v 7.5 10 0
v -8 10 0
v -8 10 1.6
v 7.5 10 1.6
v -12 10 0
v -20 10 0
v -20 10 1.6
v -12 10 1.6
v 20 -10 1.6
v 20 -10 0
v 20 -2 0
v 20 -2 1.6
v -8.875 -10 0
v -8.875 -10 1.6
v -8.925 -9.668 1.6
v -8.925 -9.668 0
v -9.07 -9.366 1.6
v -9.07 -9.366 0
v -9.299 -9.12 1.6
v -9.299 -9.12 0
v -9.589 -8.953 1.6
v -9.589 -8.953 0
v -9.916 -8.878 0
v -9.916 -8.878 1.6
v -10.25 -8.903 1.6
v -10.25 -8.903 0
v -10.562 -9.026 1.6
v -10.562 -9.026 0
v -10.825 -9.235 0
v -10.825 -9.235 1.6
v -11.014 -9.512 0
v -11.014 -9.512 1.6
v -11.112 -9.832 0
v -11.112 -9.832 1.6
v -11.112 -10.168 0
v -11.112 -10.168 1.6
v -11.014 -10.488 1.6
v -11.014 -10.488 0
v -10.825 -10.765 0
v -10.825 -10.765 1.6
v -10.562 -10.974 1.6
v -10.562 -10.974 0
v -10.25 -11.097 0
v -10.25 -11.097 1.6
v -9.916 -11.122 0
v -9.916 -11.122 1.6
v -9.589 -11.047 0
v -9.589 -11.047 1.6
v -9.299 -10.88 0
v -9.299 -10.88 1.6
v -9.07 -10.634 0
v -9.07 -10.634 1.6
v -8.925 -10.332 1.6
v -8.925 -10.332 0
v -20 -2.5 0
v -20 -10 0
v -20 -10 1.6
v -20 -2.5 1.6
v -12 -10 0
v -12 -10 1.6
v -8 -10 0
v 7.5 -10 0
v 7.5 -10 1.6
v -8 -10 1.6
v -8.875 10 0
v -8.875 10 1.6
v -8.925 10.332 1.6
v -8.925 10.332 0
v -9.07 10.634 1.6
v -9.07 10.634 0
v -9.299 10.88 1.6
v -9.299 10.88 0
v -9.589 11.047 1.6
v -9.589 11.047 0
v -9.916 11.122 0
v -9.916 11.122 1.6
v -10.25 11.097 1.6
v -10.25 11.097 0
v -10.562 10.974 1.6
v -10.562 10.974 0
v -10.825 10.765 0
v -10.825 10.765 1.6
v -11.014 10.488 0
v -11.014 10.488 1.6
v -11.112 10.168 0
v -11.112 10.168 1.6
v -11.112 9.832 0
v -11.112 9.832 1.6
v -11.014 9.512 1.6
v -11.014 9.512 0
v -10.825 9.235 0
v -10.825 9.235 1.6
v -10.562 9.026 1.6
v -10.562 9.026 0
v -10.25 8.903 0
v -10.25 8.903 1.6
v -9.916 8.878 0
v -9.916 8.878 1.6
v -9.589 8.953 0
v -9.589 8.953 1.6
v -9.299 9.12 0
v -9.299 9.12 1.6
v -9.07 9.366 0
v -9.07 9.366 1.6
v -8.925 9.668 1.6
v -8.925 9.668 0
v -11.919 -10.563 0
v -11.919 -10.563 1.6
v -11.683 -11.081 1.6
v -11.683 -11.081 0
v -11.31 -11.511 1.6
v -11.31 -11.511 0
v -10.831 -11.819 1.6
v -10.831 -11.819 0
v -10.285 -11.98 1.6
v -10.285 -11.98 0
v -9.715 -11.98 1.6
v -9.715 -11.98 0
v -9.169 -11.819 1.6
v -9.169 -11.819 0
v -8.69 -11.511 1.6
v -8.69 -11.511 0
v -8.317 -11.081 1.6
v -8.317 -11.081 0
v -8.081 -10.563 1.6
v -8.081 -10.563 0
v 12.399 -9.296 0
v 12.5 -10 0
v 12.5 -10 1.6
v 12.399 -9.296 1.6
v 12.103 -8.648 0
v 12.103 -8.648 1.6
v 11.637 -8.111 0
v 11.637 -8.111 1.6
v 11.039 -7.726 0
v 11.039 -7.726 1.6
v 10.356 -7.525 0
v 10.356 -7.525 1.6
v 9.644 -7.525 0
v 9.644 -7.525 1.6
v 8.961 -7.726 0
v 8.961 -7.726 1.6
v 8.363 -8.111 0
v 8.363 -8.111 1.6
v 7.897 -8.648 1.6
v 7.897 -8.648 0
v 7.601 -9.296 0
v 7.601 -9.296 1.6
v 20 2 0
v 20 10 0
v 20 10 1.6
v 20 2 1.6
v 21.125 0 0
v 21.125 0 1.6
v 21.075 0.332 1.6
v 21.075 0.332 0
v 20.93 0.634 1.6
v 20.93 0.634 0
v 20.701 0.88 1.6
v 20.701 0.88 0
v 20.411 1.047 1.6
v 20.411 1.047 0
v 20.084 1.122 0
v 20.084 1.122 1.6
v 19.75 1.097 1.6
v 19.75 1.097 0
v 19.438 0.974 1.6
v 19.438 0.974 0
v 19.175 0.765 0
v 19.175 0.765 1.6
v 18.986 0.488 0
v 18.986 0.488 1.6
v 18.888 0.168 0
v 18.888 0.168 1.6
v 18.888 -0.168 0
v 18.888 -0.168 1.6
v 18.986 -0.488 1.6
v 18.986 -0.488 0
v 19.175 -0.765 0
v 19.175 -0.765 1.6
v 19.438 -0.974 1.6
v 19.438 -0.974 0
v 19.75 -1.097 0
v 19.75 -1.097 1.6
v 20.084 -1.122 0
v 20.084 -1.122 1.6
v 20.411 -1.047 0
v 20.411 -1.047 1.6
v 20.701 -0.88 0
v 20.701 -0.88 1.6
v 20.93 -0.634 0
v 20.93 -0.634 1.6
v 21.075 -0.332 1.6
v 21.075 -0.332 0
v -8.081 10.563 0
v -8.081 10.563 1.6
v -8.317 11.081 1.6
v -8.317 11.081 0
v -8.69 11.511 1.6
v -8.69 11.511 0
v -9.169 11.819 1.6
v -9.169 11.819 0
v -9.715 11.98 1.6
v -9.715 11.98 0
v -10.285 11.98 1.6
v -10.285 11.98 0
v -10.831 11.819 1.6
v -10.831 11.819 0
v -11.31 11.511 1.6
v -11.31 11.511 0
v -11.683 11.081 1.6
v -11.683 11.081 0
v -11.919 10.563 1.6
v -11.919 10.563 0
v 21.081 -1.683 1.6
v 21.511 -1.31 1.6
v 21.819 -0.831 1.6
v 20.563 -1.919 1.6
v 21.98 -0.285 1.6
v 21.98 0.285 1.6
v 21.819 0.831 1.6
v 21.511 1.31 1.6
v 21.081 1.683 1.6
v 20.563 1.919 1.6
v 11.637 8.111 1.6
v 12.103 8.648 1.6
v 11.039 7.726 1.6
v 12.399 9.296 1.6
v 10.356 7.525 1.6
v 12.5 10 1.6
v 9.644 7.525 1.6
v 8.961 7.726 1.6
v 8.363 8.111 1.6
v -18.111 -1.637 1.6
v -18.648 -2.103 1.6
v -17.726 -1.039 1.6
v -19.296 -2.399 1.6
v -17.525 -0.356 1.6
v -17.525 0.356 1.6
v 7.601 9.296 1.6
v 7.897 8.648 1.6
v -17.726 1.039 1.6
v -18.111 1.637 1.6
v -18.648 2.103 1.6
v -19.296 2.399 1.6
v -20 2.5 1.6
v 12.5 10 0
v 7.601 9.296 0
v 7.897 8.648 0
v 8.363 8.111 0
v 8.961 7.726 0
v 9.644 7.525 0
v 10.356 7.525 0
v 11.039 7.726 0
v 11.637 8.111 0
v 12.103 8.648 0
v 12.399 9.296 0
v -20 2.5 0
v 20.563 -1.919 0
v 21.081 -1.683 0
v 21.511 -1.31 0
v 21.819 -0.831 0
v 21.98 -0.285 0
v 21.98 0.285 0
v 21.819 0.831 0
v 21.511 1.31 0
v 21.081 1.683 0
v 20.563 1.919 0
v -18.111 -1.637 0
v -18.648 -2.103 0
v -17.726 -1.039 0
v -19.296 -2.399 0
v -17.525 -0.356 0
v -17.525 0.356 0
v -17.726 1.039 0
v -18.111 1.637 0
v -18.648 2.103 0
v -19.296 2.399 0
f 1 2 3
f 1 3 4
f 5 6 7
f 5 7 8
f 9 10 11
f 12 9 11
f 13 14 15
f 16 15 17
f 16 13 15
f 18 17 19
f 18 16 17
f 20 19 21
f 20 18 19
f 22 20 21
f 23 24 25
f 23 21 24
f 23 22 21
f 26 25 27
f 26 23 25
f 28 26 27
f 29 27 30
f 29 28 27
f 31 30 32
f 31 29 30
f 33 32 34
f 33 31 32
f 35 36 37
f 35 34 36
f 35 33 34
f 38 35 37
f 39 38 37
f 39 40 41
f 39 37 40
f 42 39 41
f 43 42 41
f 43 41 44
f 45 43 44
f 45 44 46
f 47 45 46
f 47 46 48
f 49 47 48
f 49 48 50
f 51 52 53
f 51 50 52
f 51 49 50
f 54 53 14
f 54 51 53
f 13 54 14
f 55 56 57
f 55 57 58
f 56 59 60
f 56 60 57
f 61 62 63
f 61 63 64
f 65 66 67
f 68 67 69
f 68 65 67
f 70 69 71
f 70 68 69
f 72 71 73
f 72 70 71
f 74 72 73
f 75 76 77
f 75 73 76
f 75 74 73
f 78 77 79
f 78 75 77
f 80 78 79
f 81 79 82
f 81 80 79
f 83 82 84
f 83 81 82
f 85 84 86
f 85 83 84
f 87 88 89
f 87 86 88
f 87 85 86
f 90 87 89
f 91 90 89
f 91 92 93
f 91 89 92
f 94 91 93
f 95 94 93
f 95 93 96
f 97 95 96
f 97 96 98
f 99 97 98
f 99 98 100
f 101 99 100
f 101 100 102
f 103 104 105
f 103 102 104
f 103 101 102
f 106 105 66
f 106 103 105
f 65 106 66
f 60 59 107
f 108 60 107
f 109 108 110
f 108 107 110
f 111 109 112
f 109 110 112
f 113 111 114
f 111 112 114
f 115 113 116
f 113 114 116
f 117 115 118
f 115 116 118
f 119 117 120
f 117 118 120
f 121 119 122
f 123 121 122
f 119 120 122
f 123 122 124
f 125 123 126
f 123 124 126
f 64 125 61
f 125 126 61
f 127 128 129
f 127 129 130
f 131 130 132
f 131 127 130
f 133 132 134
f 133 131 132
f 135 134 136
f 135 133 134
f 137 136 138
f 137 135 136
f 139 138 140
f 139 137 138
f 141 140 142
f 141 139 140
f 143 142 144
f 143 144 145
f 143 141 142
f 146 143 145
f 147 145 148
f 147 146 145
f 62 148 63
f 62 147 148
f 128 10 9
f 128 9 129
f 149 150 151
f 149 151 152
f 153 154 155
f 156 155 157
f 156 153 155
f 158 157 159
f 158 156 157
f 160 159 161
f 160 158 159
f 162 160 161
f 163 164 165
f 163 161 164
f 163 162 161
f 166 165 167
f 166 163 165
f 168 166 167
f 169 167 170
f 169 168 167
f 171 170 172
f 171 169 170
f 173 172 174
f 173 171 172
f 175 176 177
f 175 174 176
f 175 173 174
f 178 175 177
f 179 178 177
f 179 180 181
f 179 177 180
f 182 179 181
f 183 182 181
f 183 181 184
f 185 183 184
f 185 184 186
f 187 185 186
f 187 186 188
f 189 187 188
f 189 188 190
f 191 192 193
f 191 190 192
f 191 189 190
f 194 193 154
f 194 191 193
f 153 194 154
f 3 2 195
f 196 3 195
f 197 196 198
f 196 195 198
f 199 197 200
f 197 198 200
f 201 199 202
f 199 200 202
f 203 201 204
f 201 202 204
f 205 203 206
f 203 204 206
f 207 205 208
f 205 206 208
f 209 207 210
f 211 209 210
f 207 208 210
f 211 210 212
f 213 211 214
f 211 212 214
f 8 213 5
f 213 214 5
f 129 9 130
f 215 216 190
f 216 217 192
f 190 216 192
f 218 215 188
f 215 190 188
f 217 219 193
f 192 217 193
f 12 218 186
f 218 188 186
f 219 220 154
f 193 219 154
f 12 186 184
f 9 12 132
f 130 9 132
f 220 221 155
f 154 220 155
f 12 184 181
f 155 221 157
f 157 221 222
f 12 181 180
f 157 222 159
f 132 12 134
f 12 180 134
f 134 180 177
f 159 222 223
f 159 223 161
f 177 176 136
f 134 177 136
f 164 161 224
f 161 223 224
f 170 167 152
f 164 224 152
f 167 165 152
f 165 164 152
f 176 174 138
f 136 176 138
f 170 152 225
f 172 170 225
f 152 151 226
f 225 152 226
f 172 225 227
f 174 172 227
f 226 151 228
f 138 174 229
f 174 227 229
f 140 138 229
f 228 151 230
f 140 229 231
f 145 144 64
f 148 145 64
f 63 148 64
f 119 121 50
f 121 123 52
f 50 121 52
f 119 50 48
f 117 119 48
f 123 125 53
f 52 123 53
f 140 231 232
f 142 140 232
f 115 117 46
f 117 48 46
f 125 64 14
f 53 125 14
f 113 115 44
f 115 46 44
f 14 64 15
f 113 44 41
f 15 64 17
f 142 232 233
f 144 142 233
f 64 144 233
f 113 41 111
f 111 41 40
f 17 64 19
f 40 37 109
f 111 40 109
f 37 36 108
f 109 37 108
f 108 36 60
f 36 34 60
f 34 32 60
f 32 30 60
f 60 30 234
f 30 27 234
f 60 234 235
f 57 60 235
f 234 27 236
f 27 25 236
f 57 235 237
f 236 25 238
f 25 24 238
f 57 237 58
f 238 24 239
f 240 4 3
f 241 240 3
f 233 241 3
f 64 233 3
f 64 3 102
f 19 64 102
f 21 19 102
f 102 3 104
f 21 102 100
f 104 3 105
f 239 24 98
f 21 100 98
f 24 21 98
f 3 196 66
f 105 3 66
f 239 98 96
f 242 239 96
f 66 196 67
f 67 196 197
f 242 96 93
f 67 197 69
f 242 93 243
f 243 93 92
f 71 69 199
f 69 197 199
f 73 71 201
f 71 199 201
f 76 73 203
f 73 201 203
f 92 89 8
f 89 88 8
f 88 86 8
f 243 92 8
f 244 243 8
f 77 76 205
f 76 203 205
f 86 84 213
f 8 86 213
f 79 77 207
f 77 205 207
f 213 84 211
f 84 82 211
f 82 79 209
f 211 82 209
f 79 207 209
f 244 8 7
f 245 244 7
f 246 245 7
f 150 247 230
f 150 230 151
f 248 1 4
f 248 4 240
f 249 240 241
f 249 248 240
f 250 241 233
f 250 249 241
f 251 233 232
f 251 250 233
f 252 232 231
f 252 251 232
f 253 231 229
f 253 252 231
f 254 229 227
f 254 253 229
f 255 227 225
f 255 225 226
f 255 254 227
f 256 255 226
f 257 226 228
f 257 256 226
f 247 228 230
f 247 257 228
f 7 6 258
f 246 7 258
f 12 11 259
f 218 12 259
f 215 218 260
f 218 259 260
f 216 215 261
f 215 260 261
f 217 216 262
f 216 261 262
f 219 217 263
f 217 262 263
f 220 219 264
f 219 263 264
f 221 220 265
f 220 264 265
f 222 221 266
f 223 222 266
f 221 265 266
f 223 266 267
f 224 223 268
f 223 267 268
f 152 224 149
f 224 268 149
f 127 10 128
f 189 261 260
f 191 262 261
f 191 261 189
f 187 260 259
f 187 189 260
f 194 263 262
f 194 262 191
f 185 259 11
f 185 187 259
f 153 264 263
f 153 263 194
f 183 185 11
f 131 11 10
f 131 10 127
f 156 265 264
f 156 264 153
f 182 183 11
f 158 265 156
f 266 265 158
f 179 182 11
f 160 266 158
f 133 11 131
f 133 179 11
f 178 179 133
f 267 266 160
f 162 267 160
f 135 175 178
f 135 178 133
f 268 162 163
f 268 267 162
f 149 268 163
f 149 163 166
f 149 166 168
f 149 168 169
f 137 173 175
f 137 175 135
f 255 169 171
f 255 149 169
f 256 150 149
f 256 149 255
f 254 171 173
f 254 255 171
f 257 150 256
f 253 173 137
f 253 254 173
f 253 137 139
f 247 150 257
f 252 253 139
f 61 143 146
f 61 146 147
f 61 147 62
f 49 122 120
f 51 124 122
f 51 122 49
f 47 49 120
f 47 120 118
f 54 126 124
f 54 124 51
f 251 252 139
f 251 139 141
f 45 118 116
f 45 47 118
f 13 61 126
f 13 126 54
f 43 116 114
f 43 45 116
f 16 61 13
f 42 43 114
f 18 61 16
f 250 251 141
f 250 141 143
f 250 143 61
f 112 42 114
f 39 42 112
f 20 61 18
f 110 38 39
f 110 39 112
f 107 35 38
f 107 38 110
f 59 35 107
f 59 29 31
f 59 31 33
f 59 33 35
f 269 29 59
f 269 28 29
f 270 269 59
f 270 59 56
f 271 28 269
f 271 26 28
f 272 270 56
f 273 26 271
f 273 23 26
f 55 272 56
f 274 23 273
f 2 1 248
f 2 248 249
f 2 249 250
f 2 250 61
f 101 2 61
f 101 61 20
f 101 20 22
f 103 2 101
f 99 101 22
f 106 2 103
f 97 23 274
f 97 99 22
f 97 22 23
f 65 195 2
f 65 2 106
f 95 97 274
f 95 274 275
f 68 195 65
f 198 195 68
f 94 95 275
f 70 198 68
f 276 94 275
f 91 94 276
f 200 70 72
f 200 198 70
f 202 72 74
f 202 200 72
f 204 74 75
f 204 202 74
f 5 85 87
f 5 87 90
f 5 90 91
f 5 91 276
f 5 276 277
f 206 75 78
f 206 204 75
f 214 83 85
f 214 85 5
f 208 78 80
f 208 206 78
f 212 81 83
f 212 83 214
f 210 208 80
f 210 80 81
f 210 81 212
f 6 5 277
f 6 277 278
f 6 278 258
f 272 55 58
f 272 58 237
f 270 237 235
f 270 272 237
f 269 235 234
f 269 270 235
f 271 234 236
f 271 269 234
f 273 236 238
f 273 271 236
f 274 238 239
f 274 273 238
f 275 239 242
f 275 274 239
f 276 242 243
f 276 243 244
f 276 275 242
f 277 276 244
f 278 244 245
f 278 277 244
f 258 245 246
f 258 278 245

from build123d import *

# Parameters (mm, degrees)
PAD_DEPTH    = 1.6
SKETCH001_R  = 1.125
POCKET_DEPTH = 1.601


with BuildPart() as part:
    # Sketch → Pad (new body)
    with BuildSketch(Plane.XY):
        with BuildLine():
            Line((-20, 10), (-12, 10))
            ThreePointArc((-8, 10), (-10, 12), (-12, 10))
            Line((-8, 10), (0, 10))
            Line((0, 10), (7.5, 10))
            ThreePointArc((7.5, 10), (10, 7.5), (12.5, 10))
            Line((12.5, 10), (20, 10))
            Line((20, 10), (20, 2))
            ThreePointArc((20, -2), (22, 0), (20, 2))
            Line((20, -10), (20, -2))
            Line((20, -10), (12.5, -10))
            ThreePointArc((12.5, -10), (10, -7.5), (7.5, -10))
            Line((7.5, -10), (0, -10))
            Line((0, -10), (-8, -10))
            ThreePointArc((-12, -10), (-10, -12), (-8, -10))
            Line((-12, -10), (-20, -10))
            Line((-20, -10), (-20, -2.5))
            ThreePointArc((-20, -2.5), (-17.5, 0), (-20, 2.5))
            Line((-20, 10), (-20, 2.5))
        make_face()
    extrude(amount=PAD_DEPTH)

    # Sketch001 → Pocket (cut, through all)
    with BuildSketch(Plane.XY):
        with Locations((-10, 10)):
            Circle(SKETCH001_R)
        with Locations((-10, -10)):
            Circle(SKETCH001_R)
        with Locations((20, 0)):
            Circle(SKETCH001_R)
    extrude(amount=POCKET_DEPTH, mode=Mode.SUBTRACT)


solid = part.part
